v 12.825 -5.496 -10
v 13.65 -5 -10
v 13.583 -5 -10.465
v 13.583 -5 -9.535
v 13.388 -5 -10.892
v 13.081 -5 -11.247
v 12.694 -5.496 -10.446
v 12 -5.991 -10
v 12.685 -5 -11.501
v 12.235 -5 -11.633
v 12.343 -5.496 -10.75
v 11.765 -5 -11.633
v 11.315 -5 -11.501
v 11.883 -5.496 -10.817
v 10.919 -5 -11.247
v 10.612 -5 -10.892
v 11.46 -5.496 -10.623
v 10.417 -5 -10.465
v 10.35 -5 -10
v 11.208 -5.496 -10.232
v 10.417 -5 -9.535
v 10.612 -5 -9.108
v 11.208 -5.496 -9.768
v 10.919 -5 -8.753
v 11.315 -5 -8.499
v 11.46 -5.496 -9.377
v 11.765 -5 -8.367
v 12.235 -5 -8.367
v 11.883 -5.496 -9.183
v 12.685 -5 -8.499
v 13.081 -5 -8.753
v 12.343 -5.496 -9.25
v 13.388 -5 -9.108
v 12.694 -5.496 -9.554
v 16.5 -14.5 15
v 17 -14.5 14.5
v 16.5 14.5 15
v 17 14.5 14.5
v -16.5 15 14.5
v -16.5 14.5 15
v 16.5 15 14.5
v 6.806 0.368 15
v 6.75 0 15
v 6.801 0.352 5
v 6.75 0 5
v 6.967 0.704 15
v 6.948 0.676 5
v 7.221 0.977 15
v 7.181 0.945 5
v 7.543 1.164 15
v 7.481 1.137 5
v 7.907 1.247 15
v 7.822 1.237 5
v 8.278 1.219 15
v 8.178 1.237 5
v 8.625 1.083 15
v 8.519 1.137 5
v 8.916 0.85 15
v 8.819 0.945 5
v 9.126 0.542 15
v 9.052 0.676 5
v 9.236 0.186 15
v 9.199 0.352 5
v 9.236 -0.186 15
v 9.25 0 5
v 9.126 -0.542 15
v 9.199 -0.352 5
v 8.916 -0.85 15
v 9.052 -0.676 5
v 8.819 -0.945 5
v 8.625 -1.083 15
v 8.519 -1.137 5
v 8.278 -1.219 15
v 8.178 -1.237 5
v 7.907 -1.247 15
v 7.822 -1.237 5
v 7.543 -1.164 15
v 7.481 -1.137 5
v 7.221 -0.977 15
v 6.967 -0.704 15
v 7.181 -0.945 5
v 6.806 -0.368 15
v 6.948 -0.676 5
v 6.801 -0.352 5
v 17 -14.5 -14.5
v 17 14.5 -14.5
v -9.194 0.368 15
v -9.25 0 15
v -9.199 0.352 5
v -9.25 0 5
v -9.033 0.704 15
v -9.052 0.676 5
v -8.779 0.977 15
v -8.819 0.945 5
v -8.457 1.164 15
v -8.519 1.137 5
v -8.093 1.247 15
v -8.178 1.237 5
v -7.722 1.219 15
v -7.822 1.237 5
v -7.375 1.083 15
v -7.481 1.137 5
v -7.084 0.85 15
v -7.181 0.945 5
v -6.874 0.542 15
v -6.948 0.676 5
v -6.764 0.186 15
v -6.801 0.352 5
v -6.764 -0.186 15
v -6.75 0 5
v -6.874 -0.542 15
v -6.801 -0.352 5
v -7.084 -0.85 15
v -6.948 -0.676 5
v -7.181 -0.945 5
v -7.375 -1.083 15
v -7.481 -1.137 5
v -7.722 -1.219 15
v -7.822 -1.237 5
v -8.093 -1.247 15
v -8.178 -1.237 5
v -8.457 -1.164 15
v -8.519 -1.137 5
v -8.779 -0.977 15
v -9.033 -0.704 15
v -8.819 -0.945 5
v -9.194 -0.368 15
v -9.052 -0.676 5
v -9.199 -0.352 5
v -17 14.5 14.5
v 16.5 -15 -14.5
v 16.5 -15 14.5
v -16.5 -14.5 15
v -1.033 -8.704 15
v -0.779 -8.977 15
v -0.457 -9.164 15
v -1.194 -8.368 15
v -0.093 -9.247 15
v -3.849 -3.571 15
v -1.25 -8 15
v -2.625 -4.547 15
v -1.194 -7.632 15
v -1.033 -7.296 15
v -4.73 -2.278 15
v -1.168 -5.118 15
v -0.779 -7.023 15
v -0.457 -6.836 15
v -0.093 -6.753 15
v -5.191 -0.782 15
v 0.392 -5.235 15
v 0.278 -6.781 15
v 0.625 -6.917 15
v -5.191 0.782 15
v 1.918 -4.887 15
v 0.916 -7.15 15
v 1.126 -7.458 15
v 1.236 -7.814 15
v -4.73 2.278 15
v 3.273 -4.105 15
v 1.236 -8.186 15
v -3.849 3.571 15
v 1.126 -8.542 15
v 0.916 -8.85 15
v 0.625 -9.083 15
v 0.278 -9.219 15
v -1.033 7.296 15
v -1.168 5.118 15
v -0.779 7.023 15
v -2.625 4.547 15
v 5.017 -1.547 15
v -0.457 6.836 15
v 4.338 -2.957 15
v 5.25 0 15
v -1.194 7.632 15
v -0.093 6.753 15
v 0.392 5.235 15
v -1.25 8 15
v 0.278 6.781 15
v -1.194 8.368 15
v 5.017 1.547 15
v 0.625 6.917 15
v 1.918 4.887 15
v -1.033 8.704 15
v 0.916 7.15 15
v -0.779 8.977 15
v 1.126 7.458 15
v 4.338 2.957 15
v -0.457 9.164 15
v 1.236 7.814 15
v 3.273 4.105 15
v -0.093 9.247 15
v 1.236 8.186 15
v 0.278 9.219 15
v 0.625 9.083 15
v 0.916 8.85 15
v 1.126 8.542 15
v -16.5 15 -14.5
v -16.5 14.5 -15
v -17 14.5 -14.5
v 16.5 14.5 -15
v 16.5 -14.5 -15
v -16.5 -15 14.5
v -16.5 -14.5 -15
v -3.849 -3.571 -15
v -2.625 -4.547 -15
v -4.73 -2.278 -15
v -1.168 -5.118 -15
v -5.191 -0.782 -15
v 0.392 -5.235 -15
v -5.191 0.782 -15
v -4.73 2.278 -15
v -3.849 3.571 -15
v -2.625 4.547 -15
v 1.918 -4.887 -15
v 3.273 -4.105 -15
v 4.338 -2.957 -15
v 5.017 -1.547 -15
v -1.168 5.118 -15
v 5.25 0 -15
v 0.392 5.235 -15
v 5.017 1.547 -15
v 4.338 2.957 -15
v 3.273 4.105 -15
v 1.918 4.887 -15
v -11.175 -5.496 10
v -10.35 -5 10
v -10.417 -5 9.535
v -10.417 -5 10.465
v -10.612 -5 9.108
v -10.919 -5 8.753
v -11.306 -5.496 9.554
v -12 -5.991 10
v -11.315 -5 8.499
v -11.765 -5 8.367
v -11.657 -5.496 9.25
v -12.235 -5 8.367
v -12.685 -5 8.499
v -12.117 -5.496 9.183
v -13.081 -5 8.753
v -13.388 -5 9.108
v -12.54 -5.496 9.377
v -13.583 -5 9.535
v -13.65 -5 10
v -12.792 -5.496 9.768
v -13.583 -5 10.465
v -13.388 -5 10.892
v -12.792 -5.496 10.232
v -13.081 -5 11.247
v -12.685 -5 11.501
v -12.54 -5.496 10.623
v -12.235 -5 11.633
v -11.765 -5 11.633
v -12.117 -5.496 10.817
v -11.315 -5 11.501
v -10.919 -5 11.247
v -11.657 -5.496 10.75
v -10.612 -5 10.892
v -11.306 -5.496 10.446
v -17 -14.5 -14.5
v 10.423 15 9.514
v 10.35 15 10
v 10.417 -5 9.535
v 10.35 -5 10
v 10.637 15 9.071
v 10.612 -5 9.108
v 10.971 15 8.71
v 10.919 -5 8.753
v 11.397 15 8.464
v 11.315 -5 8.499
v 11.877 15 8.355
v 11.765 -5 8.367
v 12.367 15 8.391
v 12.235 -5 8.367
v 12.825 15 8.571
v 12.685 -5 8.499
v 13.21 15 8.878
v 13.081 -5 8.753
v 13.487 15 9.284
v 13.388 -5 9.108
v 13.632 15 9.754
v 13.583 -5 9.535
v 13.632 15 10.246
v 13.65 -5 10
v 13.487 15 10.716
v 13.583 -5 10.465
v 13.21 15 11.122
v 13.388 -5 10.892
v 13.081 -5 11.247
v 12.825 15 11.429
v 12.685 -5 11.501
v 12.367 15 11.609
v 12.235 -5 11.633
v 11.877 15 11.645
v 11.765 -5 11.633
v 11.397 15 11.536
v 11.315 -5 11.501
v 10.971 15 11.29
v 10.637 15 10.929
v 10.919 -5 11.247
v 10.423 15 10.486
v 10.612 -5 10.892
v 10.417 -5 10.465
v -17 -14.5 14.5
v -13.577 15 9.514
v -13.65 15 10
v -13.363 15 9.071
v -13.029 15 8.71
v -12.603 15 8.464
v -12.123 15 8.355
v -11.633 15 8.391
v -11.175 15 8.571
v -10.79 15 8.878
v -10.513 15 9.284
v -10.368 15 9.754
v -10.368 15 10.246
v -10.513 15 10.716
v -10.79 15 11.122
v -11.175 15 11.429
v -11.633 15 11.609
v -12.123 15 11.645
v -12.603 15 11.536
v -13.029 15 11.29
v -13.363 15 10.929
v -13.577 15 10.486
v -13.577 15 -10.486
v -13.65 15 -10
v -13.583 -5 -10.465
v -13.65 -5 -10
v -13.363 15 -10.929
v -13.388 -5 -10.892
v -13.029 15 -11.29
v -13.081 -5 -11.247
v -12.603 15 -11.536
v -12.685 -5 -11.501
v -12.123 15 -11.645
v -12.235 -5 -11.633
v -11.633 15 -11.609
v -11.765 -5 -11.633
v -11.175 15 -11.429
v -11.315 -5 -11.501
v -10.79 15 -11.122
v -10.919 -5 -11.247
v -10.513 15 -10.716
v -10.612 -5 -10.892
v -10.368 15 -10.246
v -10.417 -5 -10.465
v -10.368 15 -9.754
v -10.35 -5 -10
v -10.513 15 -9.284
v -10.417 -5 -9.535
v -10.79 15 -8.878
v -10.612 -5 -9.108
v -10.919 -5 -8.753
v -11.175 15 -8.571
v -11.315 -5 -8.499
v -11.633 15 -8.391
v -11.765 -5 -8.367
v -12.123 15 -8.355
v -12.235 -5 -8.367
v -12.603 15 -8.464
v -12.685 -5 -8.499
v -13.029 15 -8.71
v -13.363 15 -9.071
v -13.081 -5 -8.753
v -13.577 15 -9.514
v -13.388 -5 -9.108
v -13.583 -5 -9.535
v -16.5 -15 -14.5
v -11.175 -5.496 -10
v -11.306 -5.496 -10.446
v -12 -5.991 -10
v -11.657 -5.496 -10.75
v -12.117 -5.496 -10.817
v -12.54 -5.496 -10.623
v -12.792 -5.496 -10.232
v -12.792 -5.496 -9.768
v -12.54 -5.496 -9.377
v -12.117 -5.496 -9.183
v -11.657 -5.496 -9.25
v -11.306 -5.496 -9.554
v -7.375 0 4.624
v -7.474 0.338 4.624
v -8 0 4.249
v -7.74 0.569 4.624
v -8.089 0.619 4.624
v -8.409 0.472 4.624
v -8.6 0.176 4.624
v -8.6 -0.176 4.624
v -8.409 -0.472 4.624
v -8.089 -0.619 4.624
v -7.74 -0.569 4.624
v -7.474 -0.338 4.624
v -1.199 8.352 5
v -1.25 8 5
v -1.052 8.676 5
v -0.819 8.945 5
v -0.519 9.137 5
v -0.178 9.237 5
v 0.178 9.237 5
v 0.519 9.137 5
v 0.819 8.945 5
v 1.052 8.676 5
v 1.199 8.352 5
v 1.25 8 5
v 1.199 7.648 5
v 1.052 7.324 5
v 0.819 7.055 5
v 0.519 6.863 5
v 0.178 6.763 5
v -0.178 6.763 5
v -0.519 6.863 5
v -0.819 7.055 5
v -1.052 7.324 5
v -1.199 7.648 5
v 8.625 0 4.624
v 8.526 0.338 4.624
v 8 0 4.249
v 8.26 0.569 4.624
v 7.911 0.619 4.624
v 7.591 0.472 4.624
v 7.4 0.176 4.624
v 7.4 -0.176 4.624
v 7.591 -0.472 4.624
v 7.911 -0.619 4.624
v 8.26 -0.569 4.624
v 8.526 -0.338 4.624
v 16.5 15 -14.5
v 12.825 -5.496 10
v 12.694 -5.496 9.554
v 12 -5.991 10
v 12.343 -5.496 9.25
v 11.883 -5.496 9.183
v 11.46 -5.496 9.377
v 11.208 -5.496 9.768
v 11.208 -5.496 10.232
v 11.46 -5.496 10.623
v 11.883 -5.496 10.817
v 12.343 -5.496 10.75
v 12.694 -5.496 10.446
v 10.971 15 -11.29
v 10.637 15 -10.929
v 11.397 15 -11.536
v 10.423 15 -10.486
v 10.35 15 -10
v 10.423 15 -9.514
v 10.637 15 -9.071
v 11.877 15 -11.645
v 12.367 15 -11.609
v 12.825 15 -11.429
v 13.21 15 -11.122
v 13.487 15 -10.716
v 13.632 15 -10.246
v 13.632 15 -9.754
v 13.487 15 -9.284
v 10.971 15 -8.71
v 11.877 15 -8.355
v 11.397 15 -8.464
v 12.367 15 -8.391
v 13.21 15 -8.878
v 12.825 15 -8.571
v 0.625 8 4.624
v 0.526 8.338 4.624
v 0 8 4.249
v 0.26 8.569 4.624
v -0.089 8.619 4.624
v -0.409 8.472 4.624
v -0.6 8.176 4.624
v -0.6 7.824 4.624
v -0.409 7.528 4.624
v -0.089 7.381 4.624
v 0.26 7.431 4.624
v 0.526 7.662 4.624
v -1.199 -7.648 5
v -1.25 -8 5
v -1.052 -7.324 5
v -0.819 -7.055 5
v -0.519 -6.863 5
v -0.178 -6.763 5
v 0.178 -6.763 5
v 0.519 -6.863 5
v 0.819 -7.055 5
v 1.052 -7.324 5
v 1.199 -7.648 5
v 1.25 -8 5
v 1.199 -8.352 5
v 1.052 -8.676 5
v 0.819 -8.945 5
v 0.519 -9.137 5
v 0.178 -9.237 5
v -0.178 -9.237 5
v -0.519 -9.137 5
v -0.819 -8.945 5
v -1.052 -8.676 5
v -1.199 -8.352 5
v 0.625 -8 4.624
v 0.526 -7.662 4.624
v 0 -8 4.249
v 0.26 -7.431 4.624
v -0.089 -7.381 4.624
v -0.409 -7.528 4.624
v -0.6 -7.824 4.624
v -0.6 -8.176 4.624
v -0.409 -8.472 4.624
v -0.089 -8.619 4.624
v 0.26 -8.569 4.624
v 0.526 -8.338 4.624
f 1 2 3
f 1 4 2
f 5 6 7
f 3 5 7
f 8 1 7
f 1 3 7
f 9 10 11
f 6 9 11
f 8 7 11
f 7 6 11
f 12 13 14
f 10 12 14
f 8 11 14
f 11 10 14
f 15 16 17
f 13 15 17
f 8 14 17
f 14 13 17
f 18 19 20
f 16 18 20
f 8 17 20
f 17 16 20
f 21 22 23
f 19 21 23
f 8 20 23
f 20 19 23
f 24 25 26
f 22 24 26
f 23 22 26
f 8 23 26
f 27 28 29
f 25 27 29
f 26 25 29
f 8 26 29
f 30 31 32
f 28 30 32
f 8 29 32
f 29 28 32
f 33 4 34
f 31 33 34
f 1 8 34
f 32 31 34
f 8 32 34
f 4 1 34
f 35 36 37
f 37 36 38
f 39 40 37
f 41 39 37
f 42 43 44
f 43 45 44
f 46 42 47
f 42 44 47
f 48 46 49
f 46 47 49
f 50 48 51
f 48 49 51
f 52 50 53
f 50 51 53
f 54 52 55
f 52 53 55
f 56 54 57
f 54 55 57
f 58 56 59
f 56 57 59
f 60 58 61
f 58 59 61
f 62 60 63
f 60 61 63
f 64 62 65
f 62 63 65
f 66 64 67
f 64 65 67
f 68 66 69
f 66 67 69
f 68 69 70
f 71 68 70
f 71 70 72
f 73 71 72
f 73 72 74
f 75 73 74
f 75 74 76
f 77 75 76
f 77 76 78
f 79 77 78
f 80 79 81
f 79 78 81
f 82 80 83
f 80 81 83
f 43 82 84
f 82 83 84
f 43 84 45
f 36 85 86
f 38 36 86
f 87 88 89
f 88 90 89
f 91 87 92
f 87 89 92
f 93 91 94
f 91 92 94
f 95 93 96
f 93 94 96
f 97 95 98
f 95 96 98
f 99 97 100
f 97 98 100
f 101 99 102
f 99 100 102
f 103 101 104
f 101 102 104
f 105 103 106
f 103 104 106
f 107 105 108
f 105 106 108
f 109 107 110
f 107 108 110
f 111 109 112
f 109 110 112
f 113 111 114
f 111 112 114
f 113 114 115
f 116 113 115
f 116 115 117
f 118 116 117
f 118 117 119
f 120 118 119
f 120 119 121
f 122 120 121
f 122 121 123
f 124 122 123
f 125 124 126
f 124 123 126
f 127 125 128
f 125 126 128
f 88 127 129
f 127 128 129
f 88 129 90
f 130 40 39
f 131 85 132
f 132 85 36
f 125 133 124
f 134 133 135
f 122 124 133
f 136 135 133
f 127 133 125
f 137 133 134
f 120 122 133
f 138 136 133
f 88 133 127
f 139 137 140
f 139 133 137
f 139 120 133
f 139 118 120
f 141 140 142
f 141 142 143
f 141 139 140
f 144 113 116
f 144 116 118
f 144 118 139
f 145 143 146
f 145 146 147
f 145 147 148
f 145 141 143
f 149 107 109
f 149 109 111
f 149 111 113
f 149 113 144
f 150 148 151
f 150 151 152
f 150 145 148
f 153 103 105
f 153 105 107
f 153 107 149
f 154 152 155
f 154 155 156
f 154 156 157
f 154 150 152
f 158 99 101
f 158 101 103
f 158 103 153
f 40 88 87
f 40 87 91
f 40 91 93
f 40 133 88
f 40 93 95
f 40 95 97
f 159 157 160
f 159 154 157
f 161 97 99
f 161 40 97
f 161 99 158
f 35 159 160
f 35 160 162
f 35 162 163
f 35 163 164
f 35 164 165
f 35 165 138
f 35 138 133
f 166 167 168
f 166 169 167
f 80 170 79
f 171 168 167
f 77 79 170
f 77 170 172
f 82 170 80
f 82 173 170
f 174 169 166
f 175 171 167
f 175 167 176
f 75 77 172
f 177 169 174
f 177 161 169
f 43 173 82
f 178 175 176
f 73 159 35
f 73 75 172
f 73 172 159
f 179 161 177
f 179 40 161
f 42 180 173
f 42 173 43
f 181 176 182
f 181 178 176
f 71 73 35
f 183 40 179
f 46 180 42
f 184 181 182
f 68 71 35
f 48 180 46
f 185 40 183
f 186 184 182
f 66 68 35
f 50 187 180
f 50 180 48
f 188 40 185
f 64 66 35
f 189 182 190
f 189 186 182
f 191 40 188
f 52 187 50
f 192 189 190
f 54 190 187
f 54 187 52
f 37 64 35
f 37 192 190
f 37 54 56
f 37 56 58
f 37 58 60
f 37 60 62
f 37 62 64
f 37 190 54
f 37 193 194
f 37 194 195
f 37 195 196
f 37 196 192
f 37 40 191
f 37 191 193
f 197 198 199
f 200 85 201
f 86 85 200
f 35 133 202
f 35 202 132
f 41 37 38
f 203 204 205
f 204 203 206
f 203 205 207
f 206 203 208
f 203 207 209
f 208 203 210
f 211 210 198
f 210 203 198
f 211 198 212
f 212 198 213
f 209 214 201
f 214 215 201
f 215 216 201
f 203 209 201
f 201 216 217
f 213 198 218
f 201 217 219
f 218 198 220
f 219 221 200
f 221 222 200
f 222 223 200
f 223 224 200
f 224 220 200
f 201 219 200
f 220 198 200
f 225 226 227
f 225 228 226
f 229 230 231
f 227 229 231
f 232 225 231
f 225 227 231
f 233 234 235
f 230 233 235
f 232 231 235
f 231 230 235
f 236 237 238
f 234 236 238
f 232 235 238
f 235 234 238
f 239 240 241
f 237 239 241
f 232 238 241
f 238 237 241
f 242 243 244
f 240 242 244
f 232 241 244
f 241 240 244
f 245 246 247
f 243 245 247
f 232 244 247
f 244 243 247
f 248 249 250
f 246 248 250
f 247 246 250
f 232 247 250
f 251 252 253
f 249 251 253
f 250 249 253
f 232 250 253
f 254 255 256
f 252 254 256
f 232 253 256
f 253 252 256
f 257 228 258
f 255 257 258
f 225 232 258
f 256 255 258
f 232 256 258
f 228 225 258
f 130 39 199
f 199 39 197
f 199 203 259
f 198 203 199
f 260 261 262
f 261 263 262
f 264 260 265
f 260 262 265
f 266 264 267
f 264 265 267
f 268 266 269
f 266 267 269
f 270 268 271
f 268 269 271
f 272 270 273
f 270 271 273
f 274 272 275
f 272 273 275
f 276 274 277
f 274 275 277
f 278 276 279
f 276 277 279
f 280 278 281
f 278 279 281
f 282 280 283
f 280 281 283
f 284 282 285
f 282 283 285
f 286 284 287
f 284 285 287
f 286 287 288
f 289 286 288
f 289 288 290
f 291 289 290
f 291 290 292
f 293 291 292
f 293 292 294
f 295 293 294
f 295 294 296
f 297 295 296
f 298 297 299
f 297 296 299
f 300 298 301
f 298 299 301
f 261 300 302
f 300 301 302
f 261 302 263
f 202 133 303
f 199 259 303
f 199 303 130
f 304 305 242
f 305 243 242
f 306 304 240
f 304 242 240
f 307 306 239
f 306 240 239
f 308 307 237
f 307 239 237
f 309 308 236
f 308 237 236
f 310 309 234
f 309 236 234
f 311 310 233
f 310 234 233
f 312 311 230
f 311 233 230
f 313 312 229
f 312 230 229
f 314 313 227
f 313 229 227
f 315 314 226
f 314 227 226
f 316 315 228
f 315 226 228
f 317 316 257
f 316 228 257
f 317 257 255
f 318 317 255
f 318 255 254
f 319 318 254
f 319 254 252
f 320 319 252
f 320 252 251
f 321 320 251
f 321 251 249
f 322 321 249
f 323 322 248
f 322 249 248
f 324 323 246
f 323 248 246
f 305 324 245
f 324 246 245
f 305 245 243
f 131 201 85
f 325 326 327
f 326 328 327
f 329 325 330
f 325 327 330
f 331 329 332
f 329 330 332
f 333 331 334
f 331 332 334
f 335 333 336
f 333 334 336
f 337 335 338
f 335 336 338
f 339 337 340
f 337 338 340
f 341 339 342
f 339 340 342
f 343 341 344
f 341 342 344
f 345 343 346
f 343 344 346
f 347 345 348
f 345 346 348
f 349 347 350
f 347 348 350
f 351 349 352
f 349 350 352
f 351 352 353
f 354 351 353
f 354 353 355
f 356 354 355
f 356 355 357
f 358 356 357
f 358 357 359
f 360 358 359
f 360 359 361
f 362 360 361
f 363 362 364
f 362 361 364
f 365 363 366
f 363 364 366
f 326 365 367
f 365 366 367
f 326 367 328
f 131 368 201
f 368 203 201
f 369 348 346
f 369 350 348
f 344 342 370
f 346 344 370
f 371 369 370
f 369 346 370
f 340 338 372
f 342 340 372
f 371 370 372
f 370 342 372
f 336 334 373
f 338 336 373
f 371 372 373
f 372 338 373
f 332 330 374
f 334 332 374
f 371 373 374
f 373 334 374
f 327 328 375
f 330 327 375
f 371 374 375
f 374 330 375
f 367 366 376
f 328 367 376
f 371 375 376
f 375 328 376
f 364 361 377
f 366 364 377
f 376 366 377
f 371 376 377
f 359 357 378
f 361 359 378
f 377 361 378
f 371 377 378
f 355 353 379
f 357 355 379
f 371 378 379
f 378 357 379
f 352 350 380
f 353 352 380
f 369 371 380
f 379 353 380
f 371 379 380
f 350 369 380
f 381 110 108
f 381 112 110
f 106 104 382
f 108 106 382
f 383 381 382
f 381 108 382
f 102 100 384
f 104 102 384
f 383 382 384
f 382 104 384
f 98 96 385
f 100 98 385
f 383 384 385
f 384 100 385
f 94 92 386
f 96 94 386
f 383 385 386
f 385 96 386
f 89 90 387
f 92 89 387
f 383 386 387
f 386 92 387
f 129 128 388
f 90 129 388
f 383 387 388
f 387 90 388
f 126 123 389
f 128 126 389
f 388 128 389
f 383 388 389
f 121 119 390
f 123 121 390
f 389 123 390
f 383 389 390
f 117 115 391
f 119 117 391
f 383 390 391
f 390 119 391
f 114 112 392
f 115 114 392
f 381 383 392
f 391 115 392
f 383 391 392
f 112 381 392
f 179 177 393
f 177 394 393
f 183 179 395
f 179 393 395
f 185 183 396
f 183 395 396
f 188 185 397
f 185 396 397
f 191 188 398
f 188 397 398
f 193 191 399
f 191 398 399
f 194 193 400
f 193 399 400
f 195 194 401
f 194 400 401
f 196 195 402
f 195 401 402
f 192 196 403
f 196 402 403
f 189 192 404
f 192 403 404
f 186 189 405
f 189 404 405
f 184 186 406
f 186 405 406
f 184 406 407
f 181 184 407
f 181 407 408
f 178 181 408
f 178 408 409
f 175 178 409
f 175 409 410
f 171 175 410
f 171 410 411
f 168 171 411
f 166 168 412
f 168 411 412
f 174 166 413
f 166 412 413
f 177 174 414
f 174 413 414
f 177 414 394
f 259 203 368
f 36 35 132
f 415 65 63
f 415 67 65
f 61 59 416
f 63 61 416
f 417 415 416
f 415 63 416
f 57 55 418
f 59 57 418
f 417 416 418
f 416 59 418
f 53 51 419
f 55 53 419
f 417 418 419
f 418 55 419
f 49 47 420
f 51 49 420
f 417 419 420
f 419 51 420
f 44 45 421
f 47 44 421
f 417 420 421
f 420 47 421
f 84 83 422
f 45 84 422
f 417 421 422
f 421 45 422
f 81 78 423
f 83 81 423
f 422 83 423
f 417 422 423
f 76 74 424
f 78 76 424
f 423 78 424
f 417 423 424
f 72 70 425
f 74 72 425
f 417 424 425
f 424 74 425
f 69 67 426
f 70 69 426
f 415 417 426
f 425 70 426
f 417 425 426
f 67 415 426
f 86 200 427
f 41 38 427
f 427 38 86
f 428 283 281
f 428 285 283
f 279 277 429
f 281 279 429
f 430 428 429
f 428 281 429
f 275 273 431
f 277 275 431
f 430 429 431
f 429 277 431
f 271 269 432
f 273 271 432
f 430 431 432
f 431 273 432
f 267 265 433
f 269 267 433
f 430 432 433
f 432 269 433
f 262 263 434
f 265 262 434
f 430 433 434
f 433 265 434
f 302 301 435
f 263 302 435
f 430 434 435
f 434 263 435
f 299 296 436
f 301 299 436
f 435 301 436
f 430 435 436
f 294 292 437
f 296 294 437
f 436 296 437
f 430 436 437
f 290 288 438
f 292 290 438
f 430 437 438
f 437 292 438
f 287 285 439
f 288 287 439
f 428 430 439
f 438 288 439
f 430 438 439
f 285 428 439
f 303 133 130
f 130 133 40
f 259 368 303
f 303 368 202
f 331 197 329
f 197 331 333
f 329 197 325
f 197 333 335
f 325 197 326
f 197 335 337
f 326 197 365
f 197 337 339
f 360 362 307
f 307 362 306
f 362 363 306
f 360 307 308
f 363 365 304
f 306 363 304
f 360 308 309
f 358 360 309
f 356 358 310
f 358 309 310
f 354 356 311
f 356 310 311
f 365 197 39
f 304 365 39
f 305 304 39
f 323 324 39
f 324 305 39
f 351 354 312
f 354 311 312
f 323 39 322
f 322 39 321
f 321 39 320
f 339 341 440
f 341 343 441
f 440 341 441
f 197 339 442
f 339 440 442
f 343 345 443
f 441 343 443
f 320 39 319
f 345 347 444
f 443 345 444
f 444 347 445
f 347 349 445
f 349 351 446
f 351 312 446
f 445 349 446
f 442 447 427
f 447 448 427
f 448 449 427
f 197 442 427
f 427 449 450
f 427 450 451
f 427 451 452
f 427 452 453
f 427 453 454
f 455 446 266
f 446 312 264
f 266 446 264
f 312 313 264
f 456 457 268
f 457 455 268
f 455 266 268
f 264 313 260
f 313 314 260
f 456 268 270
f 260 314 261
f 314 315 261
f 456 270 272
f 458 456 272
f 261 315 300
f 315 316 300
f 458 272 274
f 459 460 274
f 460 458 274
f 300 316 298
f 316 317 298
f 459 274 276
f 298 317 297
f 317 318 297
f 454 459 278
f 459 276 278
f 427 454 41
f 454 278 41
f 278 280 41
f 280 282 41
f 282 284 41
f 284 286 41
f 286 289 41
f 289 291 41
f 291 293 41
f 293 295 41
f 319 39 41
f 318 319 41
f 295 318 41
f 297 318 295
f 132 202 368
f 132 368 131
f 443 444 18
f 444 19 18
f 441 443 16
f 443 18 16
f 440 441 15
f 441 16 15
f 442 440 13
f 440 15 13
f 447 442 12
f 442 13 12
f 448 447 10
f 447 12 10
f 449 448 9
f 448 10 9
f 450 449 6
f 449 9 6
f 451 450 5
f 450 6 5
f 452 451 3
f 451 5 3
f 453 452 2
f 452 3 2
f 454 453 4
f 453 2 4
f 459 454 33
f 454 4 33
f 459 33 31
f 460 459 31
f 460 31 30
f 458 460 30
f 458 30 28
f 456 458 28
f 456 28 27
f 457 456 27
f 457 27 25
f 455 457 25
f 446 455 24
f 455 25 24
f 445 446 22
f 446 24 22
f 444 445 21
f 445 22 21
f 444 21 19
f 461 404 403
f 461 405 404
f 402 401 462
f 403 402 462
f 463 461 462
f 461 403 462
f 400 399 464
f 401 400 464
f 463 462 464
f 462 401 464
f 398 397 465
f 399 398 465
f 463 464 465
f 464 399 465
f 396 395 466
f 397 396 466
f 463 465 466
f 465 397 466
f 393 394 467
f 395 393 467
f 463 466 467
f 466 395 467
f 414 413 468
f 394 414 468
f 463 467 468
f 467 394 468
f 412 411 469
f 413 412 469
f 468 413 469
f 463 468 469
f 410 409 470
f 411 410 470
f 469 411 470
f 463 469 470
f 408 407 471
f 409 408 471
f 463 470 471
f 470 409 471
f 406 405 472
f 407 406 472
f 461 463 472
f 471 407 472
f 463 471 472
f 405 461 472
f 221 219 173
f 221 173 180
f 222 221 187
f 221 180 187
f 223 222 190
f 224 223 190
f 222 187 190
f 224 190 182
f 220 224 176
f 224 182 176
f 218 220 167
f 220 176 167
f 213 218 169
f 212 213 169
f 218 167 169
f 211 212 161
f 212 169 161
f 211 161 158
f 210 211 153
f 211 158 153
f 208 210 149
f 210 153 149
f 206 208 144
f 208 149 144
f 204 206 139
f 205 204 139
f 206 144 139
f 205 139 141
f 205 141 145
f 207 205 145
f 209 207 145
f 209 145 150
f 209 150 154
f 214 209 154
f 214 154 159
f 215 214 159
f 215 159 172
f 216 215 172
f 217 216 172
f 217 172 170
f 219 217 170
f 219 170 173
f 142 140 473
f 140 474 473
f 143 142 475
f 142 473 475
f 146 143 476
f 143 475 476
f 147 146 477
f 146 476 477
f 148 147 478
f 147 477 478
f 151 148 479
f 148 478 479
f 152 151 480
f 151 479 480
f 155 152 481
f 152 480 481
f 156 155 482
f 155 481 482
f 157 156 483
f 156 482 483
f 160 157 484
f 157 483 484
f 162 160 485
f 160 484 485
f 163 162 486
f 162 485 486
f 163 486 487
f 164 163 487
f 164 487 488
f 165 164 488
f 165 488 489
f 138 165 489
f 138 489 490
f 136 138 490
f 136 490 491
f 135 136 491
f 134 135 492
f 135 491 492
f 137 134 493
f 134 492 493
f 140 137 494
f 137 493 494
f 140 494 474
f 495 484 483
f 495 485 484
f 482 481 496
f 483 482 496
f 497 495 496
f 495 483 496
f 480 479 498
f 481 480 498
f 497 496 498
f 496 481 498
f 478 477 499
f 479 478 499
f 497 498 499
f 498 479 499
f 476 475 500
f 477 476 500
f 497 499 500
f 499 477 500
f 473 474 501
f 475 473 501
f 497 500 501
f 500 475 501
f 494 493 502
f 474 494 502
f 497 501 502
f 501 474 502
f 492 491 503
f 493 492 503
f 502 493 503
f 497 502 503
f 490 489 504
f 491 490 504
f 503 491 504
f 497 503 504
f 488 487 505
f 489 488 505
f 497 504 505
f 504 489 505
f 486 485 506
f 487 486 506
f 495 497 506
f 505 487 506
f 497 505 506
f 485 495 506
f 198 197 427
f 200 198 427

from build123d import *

# Parameters (mm, degrees)
SKETCH_1_W          = 34
SKETCH_1_H          = 30
EXTRUDE_1_DEPTH     = 15
SKETCH_3_R          = 5.25
CUT_EXTRUDE_1_DEPTH = 31
M3X0_5_1_D          = 2.5
M3X0_5_1_DEPTH      = 10
M3X0_5_1_TIP        = 0.751075774
M4X0_7_1_D          = 3.3
M4X0_7_1_DEPTH      = 20
M4X0_7_1_TIP        = 0.991420021
CHAMFER1_SIZE       = 0.5


with BuildPart() as part:
    # 草圖1 → 填料-伸長1 (new body, symmetric)
    with BuildSketch(Plane.XY):
        Rectangle(SKETCH_1_W, SKETCH_1_H)
    extrude(amount=EXTRUDE_1_DEPTH, both=True)

    # 草圖3 → 除料-伸長1 (cut, through all)
    with BuildSketch(Plane.XY.offset(15)):
        Circle(SKETCH_3_R)
    extrude(amount=-CUT_EXTRUDE_1_DEPTH, mode=Mode.SUBTRACT)

    # M3x0.5 螺紋孔1
    with Locations(Plane.XY.offset(15)):
        with Locations((8, 0), (-8, 0), (0, 8), (0, -8)):
            Hole(M3X0_5_1_D / 2, depth=M3X0_5_1_DEPTH)
            with Locations((0, 0, -(M3X0_5_1_DEPTH + M3X0_5_1_TIP / 2))):  # 118° drill point
                Cone(0, M3X0_5_1_D / 2, M3X0_5_1_TIP, mode=Mode.SUBTRACT)

    # M4x0.7 螺紋孔1
    with Locations(Plane(origin=(0, 15, 0), x_dir=(1, 0, 0), z_dir=(0, 1, 0))):
        with Locations((12, -10), (-12, 10), (-12, -10), (12, 10)):
            Hole(M4X0_7_1_D / 2, depth=M4X0_7_1_DEPTH)
            with Locations((0, 0, -(M4X0_7_1_DEPTH + M4X0_7_1_TIP / 2))):  # 118° drill point
                Cone(0, M4X0_7_1_D / 2, M4X0_7_1_TIP, mode=Mode.SUBTRACT)

    # Chamfer1
    chamfer1_edges = [part.edges().sort_by_distance(p)[0] for p in [
        (-17, 0, 15),
        (0, -15, 15),
        (17, 0, 15),
        (0, -15, -15),
        (-17, 0, -15),
        (0, 15, -15),
        (17, 0, -15),
        (0, 15, 15),
        (17, -15, 0),
        (-17, -15, 0),
        (-17, 15, 0),
        (17, 15, 0),
    ]]
    chamfer(chamfer1_edges, length=CHAMFER1_SIZE)


solid = part.part
